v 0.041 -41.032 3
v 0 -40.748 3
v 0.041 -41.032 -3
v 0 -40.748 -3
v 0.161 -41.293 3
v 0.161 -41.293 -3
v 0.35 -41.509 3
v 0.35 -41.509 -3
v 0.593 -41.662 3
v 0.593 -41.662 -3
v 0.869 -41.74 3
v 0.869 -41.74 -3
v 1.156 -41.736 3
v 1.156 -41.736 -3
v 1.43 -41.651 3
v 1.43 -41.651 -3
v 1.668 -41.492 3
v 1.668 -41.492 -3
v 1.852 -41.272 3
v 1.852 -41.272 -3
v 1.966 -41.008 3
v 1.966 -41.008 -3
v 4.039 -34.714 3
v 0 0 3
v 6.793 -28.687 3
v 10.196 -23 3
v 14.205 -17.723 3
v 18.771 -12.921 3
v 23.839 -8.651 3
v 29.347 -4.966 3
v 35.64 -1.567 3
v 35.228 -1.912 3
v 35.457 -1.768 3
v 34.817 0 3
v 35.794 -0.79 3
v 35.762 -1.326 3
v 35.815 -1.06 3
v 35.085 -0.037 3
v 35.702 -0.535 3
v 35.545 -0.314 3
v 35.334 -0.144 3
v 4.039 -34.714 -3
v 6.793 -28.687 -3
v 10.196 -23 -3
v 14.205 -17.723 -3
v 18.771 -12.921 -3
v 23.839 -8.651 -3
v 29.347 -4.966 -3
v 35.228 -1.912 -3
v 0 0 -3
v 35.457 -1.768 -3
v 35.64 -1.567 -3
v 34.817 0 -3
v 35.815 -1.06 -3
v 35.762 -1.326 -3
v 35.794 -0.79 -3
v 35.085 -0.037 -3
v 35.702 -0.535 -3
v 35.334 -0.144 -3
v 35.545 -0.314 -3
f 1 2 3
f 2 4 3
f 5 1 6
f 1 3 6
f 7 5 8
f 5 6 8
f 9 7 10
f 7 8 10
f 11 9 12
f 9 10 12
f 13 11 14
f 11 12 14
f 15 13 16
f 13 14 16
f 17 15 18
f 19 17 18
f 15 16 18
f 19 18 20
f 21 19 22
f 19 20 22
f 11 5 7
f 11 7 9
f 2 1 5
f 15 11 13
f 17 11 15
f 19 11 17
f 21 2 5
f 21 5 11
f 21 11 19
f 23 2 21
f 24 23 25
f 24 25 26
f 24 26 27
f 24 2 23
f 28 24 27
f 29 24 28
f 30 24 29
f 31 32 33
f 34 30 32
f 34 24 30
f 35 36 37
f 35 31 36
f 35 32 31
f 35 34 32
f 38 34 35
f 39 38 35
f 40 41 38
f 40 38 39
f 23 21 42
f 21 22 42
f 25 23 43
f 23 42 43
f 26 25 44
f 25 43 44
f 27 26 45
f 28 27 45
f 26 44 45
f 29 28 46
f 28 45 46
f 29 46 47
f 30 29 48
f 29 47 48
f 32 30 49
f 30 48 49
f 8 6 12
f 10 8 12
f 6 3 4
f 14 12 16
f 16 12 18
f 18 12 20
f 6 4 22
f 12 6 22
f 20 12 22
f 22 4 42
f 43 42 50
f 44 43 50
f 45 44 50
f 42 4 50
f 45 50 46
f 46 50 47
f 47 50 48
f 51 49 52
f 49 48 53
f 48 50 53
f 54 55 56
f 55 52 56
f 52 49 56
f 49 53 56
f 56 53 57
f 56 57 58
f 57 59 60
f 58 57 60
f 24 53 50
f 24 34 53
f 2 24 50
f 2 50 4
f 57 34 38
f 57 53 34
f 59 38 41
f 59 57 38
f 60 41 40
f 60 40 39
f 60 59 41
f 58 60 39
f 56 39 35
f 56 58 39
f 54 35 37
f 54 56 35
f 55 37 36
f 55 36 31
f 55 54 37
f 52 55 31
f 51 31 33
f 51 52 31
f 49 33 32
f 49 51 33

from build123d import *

# Parameters (mm, degrees)
BOSS_EXTRUDE1_DEPTH     = 3
CUT_EXTRUDE1_DEPTH      = 73.173402303
CUT_EXTRUDE1_DEPTH_BACK = 73.173402303
FILLET1_R               = 1


with BuildPart() as part:
    # Sketch1 → Boss-Extrude1 (new, symmetric)
    with BuildSketch(Plane.XY):
        Polygon((0, 0), (0, -60), (40, 0), align=None)
    extrude(amount=BOSS_EXTRUDE1_DEPTH, both=True)

    # Sketch2 → Cut-Extrude1 (cut, two sides: drawn at the far end of the back side and taken through both)
    with BuildSketch(Plane.XY.offset(-CUT_EXTRUDE1_DEPTH_BACK)):
        with BuildLine():
            Line((40, 0), (0, -60))
            ThreePointArc((0, -60), (9.980712645, -23.320475097), (40, 0))
        make_face()
    extrude(amount=CUT_EXTRUDE1_DEPTH + CUT_EXTRUDE1_DEPTH_BACK, mode=Mode.SUBTRACT)

    # Fillet1
    fillet1_edges = [part.edges().sort_by_distance(p)[0] for p in [
        (0, -53.204973741, 0),
        (40, 0, 0),
    ]]
    fillet(fillet1_edges, radius=FILLET1_R)


solid = part.part
